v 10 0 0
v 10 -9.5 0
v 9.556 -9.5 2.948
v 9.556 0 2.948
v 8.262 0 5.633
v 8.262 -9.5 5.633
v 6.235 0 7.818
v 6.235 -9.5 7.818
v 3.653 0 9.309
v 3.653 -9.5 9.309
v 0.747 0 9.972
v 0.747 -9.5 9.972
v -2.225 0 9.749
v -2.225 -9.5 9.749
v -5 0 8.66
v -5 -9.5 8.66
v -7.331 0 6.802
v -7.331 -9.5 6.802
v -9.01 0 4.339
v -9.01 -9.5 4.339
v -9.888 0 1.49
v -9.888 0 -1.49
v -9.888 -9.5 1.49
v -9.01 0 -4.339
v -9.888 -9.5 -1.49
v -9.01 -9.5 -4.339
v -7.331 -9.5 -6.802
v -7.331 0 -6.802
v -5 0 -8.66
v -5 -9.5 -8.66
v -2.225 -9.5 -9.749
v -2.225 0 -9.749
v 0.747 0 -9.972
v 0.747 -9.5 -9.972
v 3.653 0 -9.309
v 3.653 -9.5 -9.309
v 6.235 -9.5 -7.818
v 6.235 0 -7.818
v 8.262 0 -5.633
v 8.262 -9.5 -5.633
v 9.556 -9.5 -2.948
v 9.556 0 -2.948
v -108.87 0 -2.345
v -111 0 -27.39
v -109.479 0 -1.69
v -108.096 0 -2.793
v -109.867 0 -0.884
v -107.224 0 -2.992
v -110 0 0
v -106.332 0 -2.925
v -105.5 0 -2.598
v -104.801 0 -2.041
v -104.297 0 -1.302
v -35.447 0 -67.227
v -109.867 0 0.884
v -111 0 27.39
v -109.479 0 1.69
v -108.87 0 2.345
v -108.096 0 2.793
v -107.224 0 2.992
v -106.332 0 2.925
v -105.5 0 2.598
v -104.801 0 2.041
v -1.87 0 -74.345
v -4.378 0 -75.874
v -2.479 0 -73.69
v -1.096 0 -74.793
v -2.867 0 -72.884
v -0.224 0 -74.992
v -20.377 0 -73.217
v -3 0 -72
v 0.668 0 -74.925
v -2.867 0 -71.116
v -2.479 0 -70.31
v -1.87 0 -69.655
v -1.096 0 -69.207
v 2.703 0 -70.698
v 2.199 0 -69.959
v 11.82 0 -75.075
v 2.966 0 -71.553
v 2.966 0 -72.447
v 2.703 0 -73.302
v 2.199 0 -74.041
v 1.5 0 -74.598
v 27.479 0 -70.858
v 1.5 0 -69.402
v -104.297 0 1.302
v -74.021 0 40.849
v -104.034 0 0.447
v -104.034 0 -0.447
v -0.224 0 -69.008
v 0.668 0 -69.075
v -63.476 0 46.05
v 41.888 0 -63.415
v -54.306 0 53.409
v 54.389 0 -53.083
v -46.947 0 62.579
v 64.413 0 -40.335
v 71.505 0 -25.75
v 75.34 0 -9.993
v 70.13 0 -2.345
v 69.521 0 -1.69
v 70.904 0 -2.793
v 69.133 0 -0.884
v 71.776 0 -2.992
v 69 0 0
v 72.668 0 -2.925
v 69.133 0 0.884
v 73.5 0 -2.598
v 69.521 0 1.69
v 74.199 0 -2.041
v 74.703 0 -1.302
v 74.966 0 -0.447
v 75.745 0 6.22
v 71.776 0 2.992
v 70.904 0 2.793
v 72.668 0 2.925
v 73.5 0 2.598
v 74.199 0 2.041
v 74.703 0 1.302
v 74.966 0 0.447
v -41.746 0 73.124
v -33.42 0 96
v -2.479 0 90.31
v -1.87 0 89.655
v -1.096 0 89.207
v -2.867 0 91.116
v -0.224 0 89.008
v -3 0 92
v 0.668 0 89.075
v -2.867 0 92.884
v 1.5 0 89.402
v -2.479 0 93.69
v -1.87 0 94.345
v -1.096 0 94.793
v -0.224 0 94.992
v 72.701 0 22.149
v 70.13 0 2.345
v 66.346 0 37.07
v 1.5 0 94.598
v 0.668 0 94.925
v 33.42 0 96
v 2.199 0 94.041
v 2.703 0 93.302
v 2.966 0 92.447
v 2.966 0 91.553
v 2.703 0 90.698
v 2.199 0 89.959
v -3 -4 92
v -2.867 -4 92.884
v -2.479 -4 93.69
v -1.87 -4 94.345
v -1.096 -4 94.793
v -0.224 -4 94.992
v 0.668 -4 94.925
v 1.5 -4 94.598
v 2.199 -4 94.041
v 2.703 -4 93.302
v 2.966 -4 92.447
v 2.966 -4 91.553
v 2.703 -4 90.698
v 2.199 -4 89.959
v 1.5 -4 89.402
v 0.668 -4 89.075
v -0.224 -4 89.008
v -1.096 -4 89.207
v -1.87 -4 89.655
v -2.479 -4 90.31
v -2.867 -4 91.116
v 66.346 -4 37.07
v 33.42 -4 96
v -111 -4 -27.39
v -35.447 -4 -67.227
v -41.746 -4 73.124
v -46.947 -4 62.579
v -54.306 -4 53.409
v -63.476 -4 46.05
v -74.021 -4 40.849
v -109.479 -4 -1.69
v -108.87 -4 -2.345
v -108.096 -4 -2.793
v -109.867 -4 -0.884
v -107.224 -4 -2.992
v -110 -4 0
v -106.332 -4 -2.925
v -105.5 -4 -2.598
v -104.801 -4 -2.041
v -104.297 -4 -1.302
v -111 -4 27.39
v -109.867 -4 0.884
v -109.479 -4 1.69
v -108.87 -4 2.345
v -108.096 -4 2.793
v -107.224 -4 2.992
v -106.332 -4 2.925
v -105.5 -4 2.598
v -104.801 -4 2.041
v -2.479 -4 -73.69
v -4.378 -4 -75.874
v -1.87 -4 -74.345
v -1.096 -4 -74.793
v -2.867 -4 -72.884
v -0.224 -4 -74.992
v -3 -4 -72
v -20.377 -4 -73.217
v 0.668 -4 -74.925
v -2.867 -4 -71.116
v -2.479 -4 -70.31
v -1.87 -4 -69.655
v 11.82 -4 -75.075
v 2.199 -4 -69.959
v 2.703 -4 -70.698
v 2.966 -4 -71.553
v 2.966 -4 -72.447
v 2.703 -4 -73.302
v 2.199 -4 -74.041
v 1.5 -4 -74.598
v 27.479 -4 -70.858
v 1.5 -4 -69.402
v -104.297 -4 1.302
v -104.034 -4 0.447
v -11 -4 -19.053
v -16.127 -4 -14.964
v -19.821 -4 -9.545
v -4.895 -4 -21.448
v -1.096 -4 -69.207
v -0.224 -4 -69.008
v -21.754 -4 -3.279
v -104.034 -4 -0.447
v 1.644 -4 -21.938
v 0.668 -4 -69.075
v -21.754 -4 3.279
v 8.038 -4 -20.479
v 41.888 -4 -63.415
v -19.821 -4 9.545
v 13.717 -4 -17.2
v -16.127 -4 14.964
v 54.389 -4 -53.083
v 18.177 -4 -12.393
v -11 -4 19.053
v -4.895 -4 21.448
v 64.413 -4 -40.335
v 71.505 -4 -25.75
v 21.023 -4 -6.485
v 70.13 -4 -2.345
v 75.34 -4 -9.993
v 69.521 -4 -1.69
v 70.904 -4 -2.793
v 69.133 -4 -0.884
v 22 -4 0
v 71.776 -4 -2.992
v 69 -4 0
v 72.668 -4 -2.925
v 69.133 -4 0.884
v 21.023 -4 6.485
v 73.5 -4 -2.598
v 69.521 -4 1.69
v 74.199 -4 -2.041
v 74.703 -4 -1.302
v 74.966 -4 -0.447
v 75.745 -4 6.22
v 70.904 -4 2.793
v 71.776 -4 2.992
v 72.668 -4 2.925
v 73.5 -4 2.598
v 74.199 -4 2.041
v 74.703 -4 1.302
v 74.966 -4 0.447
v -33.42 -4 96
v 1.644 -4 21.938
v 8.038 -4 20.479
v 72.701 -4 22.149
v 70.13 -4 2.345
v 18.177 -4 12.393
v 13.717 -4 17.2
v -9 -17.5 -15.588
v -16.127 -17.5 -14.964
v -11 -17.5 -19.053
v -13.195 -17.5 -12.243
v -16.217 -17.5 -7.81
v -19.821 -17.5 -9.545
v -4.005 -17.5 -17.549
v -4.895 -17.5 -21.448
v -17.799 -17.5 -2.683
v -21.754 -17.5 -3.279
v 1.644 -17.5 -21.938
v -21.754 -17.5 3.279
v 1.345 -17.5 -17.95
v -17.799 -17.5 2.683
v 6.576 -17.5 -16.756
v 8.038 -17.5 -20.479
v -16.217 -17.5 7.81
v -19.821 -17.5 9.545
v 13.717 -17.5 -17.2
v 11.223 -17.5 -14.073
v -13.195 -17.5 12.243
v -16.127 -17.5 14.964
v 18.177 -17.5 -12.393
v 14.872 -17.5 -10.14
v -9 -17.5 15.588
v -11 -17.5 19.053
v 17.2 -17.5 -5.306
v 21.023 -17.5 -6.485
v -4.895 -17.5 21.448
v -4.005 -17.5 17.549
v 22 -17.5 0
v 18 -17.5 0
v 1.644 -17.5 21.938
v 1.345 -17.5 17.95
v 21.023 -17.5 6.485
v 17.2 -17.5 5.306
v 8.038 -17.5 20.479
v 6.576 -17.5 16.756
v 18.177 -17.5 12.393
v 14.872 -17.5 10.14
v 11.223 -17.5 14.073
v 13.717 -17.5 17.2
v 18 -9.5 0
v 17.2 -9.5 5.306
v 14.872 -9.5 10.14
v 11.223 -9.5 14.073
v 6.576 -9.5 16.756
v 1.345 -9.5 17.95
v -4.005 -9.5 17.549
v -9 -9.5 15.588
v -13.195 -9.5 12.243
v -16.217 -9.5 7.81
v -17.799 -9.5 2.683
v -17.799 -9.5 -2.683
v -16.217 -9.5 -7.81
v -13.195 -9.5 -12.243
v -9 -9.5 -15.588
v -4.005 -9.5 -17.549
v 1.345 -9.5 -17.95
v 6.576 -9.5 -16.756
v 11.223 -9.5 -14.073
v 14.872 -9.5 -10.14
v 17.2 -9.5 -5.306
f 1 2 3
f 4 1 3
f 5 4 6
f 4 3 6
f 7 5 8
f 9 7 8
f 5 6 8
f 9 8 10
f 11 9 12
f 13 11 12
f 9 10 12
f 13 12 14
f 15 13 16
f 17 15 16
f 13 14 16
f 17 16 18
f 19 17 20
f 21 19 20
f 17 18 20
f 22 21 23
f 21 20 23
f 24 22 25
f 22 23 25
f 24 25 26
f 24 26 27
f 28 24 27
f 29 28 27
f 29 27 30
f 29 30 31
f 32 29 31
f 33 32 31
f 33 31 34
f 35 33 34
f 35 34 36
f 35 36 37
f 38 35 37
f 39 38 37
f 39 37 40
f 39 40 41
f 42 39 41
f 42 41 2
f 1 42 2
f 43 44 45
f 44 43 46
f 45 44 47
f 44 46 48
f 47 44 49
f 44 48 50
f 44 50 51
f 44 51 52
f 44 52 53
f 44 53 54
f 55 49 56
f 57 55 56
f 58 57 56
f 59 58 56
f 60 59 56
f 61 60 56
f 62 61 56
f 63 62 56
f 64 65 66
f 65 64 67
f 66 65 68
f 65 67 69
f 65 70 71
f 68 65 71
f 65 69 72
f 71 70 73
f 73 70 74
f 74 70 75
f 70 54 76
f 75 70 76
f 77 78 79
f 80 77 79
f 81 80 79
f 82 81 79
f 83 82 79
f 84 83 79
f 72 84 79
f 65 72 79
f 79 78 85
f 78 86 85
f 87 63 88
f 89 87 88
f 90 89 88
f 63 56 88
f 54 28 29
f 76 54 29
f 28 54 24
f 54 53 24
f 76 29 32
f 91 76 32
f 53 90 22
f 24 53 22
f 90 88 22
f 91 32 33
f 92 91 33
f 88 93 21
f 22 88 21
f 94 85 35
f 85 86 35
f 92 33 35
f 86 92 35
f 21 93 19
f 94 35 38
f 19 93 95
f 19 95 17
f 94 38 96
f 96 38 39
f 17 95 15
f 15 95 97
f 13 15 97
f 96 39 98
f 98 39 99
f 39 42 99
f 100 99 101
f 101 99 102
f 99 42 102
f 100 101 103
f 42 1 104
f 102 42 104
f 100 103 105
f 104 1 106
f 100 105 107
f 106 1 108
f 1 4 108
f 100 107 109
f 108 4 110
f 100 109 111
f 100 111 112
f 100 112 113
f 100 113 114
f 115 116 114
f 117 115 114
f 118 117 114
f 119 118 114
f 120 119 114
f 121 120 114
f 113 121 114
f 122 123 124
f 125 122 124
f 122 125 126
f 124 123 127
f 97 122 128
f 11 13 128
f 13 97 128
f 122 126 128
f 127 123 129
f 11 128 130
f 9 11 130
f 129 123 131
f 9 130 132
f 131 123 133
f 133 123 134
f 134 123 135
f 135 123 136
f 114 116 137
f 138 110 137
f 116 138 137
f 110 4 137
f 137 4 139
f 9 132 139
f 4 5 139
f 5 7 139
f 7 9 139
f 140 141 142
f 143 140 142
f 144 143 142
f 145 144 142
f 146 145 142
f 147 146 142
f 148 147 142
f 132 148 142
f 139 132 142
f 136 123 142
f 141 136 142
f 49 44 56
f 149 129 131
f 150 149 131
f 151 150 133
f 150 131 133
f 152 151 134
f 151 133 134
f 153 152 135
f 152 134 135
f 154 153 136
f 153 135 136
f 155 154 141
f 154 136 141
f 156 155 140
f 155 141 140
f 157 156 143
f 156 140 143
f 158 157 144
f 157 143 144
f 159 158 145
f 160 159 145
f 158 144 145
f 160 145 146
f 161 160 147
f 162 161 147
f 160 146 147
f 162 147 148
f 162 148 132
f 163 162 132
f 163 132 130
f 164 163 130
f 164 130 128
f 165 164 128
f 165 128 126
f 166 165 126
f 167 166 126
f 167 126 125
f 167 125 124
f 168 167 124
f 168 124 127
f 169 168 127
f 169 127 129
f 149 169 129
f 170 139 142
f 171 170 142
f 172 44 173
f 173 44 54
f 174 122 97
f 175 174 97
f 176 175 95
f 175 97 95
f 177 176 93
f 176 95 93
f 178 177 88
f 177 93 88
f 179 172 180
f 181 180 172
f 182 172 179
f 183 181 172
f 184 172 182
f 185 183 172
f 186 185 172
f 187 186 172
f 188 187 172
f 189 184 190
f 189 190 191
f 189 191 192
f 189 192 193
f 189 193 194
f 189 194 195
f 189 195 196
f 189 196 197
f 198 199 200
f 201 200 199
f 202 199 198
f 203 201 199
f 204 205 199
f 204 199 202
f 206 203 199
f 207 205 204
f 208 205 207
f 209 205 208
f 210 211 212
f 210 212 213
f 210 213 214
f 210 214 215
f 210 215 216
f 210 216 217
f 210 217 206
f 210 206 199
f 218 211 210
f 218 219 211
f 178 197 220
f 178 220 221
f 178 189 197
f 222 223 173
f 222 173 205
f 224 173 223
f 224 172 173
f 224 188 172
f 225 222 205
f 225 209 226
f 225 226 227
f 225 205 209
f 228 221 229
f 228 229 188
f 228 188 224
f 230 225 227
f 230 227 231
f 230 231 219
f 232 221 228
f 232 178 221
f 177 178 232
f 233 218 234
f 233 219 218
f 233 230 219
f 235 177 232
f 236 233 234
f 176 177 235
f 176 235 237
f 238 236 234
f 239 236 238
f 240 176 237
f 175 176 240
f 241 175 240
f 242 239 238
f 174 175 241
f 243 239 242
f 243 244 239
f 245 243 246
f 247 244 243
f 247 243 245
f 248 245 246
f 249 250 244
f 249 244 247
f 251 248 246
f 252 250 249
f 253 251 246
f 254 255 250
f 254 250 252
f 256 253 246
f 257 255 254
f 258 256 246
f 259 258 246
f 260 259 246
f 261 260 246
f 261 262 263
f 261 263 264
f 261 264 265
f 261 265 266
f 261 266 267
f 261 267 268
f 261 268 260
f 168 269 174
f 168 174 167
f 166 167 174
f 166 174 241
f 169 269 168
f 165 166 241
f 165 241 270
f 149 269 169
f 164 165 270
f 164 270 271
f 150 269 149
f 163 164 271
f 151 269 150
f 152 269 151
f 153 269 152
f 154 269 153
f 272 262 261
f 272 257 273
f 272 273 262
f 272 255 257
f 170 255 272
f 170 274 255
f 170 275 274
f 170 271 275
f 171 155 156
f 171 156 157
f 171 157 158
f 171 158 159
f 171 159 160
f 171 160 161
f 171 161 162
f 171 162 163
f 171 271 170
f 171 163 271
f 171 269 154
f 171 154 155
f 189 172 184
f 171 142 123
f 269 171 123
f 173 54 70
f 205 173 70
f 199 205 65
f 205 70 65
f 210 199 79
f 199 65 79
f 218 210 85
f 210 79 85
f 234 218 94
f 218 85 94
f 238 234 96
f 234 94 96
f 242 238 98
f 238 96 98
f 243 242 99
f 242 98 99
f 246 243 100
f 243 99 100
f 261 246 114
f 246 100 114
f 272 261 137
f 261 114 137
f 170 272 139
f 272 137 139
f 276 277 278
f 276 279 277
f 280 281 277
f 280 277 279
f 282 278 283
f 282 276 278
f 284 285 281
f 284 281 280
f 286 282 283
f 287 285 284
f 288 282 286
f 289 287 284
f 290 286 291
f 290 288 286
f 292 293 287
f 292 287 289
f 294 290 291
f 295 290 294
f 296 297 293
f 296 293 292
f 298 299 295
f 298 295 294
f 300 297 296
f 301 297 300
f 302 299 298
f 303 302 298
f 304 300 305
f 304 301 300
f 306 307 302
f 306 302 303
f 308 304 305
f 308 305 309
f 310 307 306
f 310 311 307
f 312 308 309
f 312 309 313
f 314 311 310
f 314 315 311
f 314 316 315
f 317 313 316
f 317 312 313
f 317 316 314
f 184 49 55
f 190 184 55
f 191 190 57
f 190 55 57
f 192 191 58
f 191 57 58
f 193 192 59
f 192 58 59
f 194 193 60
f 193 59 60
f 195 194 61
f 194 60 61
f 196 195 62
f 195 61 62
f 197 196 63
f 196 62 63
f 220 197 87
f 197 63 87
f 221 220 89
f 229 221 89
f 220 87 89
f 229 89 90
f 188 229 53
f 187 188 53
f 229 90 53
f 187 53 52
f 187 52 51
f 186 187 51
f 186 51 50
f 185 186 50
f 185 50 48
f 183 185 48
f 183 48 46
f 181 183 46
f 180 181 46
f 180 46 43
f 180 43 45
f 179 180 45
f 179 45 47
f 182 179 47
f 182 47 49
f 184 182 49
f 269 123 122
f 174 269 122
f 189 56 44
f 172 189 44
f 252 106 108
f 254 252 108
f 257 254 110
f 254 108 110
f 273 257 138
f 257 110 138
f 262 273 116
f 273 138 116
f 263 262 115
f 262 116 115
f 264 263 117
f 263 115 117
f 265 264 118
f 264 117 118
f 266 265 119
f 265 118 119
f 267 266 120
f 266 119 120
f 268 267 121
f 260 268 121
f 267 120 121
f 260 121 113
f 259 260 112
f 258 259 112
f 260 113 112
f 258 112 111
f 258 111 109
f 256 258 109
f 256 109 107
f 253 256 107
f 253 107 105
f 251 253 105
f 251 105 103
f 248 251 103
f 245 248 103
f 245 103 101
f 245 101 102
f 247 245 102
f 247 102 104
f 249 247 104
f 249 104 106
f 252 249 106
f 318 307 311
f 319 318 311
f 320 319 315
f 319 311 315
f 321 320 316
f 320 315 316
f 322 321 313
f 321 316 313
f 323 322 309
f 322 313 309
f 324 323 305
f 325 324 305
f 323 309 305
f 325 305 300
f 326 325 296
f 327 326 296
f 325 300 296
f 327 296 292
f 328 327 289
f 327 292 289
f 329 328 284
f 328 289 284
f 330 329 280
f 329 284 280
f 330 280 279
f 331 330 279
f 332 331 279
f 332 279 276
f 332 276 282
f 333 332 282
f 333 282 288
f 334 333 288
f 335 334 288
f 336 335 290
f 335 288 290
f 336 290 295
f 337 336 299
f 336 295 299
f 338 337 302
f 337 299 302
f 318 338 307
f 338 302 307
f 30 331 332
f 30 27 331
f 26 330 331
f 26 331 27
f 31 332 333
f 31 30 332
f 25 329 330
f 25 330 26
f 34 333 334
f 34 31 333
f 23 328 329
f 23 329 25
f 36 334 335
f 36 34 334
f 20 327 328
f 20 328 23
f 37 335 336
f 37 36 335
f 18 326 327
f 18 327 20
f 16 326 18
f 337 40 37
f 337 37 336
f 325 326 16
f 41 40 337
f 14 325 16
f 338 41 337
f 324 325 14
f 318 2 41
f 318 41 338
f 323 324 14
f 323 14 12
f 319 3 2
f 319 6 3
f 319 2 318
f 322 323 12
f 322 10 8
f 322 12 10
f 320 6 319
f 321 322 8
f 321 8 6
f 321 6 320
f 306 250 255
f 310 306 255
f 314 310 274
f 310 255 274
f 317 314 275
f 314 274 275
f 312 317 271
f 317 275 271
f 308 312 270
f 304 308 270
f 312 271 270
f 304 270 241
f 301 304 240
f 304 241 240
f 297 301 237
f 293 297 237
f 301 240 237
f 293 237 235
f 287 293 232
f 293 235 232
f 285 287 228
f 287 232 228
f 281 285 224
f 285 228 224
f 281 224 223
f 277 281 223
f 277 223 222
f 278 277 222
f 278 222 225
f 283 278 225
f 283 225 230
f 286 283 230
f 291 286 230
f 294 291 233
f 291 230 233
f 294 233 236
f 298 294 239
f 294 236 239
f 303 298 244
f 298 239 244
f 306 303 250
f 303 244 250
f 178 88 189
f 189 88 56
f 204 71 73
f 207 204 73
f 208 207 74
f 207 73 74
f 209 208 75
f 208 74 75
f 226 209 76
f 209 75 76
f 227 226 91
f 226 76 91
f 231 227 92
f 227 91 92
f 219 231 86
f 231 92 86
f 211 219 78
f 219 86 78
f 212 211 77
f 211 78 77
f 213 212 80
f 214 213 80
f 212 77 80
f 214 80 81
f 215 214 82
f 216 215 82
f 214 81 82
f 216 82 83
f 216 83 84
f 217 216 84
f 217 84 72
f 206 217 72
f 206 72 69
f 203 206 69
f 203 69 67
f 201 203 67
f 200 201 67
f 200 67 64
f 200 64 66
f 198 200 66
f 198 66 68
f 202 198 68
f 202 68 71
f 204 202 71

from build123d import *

# Parameters (mm, degrees)
F1_DEPTH = 4
F3_D     = 6
F3_DEPTH = 10
F4_R     = 22
F5_DEPTH = 13.5
F6_R     = 18
F7_DEPTH = 8
F8_R     = 10
F9_DEPTH = 25


with BuildPart() as f1:
    # F0 (on Front) → F1 (new body)
    with BuildSketch(Plane.XZ):
        with BuildLine():
            Line((33.42, 96), (-33.42, 96))
            Line((-33.42, 96), (-41.746287, 73.123714))
            ThreePointArc((-41.746287, 73.123714), (-54.305922, 53.409036), (-74.020601, 40.849401))
            Line((-74.020601, 40.849401), (-111, 27.39))
            Line((-111, 27.39), (-111, -27.39))
            Line((-111, -27.39), (-35.447282, -67.227154))
            ThreePointArc((-35.447282, -67.227154), (54.388917, -53.083384), (66.346243, 37.069881))
            Line((66.346243, 37.069881), (33.42, 96))
        make_face()
    extrude(amount=F1_DEPTH)

    # F3
    with Locations(Plane.XZ.offset(4)):
        with Locations((0, 92), (-107, 0), (0, -72), (72, 0)):
            Hole(F3_D / 2, depth=F3_DEPTH)

    # F4 (on face) → F5 (join)
    with BuildSketch(Plane.XZ.offset(4)):
        Circle(F4_R)
    extrude(amount=F5_DEPTH)

    # F6 (on face) → F7 (cut)
    with BuildSketch(Plane.XZ.offset(17.5)):
        Circle(F6_R)
    extrude(amount=-F7_DEPTH, mode=Mode.SUBTRACT)

    # F8 (on face) → F9 (cut)
    with BuildSketch(Plane.XZ.offset(9.5)):
        Circle(F8_R)
    extrude(amount=-F9_DEPTH, mode=Mode.SUBTRACT)


solid = f1.part
